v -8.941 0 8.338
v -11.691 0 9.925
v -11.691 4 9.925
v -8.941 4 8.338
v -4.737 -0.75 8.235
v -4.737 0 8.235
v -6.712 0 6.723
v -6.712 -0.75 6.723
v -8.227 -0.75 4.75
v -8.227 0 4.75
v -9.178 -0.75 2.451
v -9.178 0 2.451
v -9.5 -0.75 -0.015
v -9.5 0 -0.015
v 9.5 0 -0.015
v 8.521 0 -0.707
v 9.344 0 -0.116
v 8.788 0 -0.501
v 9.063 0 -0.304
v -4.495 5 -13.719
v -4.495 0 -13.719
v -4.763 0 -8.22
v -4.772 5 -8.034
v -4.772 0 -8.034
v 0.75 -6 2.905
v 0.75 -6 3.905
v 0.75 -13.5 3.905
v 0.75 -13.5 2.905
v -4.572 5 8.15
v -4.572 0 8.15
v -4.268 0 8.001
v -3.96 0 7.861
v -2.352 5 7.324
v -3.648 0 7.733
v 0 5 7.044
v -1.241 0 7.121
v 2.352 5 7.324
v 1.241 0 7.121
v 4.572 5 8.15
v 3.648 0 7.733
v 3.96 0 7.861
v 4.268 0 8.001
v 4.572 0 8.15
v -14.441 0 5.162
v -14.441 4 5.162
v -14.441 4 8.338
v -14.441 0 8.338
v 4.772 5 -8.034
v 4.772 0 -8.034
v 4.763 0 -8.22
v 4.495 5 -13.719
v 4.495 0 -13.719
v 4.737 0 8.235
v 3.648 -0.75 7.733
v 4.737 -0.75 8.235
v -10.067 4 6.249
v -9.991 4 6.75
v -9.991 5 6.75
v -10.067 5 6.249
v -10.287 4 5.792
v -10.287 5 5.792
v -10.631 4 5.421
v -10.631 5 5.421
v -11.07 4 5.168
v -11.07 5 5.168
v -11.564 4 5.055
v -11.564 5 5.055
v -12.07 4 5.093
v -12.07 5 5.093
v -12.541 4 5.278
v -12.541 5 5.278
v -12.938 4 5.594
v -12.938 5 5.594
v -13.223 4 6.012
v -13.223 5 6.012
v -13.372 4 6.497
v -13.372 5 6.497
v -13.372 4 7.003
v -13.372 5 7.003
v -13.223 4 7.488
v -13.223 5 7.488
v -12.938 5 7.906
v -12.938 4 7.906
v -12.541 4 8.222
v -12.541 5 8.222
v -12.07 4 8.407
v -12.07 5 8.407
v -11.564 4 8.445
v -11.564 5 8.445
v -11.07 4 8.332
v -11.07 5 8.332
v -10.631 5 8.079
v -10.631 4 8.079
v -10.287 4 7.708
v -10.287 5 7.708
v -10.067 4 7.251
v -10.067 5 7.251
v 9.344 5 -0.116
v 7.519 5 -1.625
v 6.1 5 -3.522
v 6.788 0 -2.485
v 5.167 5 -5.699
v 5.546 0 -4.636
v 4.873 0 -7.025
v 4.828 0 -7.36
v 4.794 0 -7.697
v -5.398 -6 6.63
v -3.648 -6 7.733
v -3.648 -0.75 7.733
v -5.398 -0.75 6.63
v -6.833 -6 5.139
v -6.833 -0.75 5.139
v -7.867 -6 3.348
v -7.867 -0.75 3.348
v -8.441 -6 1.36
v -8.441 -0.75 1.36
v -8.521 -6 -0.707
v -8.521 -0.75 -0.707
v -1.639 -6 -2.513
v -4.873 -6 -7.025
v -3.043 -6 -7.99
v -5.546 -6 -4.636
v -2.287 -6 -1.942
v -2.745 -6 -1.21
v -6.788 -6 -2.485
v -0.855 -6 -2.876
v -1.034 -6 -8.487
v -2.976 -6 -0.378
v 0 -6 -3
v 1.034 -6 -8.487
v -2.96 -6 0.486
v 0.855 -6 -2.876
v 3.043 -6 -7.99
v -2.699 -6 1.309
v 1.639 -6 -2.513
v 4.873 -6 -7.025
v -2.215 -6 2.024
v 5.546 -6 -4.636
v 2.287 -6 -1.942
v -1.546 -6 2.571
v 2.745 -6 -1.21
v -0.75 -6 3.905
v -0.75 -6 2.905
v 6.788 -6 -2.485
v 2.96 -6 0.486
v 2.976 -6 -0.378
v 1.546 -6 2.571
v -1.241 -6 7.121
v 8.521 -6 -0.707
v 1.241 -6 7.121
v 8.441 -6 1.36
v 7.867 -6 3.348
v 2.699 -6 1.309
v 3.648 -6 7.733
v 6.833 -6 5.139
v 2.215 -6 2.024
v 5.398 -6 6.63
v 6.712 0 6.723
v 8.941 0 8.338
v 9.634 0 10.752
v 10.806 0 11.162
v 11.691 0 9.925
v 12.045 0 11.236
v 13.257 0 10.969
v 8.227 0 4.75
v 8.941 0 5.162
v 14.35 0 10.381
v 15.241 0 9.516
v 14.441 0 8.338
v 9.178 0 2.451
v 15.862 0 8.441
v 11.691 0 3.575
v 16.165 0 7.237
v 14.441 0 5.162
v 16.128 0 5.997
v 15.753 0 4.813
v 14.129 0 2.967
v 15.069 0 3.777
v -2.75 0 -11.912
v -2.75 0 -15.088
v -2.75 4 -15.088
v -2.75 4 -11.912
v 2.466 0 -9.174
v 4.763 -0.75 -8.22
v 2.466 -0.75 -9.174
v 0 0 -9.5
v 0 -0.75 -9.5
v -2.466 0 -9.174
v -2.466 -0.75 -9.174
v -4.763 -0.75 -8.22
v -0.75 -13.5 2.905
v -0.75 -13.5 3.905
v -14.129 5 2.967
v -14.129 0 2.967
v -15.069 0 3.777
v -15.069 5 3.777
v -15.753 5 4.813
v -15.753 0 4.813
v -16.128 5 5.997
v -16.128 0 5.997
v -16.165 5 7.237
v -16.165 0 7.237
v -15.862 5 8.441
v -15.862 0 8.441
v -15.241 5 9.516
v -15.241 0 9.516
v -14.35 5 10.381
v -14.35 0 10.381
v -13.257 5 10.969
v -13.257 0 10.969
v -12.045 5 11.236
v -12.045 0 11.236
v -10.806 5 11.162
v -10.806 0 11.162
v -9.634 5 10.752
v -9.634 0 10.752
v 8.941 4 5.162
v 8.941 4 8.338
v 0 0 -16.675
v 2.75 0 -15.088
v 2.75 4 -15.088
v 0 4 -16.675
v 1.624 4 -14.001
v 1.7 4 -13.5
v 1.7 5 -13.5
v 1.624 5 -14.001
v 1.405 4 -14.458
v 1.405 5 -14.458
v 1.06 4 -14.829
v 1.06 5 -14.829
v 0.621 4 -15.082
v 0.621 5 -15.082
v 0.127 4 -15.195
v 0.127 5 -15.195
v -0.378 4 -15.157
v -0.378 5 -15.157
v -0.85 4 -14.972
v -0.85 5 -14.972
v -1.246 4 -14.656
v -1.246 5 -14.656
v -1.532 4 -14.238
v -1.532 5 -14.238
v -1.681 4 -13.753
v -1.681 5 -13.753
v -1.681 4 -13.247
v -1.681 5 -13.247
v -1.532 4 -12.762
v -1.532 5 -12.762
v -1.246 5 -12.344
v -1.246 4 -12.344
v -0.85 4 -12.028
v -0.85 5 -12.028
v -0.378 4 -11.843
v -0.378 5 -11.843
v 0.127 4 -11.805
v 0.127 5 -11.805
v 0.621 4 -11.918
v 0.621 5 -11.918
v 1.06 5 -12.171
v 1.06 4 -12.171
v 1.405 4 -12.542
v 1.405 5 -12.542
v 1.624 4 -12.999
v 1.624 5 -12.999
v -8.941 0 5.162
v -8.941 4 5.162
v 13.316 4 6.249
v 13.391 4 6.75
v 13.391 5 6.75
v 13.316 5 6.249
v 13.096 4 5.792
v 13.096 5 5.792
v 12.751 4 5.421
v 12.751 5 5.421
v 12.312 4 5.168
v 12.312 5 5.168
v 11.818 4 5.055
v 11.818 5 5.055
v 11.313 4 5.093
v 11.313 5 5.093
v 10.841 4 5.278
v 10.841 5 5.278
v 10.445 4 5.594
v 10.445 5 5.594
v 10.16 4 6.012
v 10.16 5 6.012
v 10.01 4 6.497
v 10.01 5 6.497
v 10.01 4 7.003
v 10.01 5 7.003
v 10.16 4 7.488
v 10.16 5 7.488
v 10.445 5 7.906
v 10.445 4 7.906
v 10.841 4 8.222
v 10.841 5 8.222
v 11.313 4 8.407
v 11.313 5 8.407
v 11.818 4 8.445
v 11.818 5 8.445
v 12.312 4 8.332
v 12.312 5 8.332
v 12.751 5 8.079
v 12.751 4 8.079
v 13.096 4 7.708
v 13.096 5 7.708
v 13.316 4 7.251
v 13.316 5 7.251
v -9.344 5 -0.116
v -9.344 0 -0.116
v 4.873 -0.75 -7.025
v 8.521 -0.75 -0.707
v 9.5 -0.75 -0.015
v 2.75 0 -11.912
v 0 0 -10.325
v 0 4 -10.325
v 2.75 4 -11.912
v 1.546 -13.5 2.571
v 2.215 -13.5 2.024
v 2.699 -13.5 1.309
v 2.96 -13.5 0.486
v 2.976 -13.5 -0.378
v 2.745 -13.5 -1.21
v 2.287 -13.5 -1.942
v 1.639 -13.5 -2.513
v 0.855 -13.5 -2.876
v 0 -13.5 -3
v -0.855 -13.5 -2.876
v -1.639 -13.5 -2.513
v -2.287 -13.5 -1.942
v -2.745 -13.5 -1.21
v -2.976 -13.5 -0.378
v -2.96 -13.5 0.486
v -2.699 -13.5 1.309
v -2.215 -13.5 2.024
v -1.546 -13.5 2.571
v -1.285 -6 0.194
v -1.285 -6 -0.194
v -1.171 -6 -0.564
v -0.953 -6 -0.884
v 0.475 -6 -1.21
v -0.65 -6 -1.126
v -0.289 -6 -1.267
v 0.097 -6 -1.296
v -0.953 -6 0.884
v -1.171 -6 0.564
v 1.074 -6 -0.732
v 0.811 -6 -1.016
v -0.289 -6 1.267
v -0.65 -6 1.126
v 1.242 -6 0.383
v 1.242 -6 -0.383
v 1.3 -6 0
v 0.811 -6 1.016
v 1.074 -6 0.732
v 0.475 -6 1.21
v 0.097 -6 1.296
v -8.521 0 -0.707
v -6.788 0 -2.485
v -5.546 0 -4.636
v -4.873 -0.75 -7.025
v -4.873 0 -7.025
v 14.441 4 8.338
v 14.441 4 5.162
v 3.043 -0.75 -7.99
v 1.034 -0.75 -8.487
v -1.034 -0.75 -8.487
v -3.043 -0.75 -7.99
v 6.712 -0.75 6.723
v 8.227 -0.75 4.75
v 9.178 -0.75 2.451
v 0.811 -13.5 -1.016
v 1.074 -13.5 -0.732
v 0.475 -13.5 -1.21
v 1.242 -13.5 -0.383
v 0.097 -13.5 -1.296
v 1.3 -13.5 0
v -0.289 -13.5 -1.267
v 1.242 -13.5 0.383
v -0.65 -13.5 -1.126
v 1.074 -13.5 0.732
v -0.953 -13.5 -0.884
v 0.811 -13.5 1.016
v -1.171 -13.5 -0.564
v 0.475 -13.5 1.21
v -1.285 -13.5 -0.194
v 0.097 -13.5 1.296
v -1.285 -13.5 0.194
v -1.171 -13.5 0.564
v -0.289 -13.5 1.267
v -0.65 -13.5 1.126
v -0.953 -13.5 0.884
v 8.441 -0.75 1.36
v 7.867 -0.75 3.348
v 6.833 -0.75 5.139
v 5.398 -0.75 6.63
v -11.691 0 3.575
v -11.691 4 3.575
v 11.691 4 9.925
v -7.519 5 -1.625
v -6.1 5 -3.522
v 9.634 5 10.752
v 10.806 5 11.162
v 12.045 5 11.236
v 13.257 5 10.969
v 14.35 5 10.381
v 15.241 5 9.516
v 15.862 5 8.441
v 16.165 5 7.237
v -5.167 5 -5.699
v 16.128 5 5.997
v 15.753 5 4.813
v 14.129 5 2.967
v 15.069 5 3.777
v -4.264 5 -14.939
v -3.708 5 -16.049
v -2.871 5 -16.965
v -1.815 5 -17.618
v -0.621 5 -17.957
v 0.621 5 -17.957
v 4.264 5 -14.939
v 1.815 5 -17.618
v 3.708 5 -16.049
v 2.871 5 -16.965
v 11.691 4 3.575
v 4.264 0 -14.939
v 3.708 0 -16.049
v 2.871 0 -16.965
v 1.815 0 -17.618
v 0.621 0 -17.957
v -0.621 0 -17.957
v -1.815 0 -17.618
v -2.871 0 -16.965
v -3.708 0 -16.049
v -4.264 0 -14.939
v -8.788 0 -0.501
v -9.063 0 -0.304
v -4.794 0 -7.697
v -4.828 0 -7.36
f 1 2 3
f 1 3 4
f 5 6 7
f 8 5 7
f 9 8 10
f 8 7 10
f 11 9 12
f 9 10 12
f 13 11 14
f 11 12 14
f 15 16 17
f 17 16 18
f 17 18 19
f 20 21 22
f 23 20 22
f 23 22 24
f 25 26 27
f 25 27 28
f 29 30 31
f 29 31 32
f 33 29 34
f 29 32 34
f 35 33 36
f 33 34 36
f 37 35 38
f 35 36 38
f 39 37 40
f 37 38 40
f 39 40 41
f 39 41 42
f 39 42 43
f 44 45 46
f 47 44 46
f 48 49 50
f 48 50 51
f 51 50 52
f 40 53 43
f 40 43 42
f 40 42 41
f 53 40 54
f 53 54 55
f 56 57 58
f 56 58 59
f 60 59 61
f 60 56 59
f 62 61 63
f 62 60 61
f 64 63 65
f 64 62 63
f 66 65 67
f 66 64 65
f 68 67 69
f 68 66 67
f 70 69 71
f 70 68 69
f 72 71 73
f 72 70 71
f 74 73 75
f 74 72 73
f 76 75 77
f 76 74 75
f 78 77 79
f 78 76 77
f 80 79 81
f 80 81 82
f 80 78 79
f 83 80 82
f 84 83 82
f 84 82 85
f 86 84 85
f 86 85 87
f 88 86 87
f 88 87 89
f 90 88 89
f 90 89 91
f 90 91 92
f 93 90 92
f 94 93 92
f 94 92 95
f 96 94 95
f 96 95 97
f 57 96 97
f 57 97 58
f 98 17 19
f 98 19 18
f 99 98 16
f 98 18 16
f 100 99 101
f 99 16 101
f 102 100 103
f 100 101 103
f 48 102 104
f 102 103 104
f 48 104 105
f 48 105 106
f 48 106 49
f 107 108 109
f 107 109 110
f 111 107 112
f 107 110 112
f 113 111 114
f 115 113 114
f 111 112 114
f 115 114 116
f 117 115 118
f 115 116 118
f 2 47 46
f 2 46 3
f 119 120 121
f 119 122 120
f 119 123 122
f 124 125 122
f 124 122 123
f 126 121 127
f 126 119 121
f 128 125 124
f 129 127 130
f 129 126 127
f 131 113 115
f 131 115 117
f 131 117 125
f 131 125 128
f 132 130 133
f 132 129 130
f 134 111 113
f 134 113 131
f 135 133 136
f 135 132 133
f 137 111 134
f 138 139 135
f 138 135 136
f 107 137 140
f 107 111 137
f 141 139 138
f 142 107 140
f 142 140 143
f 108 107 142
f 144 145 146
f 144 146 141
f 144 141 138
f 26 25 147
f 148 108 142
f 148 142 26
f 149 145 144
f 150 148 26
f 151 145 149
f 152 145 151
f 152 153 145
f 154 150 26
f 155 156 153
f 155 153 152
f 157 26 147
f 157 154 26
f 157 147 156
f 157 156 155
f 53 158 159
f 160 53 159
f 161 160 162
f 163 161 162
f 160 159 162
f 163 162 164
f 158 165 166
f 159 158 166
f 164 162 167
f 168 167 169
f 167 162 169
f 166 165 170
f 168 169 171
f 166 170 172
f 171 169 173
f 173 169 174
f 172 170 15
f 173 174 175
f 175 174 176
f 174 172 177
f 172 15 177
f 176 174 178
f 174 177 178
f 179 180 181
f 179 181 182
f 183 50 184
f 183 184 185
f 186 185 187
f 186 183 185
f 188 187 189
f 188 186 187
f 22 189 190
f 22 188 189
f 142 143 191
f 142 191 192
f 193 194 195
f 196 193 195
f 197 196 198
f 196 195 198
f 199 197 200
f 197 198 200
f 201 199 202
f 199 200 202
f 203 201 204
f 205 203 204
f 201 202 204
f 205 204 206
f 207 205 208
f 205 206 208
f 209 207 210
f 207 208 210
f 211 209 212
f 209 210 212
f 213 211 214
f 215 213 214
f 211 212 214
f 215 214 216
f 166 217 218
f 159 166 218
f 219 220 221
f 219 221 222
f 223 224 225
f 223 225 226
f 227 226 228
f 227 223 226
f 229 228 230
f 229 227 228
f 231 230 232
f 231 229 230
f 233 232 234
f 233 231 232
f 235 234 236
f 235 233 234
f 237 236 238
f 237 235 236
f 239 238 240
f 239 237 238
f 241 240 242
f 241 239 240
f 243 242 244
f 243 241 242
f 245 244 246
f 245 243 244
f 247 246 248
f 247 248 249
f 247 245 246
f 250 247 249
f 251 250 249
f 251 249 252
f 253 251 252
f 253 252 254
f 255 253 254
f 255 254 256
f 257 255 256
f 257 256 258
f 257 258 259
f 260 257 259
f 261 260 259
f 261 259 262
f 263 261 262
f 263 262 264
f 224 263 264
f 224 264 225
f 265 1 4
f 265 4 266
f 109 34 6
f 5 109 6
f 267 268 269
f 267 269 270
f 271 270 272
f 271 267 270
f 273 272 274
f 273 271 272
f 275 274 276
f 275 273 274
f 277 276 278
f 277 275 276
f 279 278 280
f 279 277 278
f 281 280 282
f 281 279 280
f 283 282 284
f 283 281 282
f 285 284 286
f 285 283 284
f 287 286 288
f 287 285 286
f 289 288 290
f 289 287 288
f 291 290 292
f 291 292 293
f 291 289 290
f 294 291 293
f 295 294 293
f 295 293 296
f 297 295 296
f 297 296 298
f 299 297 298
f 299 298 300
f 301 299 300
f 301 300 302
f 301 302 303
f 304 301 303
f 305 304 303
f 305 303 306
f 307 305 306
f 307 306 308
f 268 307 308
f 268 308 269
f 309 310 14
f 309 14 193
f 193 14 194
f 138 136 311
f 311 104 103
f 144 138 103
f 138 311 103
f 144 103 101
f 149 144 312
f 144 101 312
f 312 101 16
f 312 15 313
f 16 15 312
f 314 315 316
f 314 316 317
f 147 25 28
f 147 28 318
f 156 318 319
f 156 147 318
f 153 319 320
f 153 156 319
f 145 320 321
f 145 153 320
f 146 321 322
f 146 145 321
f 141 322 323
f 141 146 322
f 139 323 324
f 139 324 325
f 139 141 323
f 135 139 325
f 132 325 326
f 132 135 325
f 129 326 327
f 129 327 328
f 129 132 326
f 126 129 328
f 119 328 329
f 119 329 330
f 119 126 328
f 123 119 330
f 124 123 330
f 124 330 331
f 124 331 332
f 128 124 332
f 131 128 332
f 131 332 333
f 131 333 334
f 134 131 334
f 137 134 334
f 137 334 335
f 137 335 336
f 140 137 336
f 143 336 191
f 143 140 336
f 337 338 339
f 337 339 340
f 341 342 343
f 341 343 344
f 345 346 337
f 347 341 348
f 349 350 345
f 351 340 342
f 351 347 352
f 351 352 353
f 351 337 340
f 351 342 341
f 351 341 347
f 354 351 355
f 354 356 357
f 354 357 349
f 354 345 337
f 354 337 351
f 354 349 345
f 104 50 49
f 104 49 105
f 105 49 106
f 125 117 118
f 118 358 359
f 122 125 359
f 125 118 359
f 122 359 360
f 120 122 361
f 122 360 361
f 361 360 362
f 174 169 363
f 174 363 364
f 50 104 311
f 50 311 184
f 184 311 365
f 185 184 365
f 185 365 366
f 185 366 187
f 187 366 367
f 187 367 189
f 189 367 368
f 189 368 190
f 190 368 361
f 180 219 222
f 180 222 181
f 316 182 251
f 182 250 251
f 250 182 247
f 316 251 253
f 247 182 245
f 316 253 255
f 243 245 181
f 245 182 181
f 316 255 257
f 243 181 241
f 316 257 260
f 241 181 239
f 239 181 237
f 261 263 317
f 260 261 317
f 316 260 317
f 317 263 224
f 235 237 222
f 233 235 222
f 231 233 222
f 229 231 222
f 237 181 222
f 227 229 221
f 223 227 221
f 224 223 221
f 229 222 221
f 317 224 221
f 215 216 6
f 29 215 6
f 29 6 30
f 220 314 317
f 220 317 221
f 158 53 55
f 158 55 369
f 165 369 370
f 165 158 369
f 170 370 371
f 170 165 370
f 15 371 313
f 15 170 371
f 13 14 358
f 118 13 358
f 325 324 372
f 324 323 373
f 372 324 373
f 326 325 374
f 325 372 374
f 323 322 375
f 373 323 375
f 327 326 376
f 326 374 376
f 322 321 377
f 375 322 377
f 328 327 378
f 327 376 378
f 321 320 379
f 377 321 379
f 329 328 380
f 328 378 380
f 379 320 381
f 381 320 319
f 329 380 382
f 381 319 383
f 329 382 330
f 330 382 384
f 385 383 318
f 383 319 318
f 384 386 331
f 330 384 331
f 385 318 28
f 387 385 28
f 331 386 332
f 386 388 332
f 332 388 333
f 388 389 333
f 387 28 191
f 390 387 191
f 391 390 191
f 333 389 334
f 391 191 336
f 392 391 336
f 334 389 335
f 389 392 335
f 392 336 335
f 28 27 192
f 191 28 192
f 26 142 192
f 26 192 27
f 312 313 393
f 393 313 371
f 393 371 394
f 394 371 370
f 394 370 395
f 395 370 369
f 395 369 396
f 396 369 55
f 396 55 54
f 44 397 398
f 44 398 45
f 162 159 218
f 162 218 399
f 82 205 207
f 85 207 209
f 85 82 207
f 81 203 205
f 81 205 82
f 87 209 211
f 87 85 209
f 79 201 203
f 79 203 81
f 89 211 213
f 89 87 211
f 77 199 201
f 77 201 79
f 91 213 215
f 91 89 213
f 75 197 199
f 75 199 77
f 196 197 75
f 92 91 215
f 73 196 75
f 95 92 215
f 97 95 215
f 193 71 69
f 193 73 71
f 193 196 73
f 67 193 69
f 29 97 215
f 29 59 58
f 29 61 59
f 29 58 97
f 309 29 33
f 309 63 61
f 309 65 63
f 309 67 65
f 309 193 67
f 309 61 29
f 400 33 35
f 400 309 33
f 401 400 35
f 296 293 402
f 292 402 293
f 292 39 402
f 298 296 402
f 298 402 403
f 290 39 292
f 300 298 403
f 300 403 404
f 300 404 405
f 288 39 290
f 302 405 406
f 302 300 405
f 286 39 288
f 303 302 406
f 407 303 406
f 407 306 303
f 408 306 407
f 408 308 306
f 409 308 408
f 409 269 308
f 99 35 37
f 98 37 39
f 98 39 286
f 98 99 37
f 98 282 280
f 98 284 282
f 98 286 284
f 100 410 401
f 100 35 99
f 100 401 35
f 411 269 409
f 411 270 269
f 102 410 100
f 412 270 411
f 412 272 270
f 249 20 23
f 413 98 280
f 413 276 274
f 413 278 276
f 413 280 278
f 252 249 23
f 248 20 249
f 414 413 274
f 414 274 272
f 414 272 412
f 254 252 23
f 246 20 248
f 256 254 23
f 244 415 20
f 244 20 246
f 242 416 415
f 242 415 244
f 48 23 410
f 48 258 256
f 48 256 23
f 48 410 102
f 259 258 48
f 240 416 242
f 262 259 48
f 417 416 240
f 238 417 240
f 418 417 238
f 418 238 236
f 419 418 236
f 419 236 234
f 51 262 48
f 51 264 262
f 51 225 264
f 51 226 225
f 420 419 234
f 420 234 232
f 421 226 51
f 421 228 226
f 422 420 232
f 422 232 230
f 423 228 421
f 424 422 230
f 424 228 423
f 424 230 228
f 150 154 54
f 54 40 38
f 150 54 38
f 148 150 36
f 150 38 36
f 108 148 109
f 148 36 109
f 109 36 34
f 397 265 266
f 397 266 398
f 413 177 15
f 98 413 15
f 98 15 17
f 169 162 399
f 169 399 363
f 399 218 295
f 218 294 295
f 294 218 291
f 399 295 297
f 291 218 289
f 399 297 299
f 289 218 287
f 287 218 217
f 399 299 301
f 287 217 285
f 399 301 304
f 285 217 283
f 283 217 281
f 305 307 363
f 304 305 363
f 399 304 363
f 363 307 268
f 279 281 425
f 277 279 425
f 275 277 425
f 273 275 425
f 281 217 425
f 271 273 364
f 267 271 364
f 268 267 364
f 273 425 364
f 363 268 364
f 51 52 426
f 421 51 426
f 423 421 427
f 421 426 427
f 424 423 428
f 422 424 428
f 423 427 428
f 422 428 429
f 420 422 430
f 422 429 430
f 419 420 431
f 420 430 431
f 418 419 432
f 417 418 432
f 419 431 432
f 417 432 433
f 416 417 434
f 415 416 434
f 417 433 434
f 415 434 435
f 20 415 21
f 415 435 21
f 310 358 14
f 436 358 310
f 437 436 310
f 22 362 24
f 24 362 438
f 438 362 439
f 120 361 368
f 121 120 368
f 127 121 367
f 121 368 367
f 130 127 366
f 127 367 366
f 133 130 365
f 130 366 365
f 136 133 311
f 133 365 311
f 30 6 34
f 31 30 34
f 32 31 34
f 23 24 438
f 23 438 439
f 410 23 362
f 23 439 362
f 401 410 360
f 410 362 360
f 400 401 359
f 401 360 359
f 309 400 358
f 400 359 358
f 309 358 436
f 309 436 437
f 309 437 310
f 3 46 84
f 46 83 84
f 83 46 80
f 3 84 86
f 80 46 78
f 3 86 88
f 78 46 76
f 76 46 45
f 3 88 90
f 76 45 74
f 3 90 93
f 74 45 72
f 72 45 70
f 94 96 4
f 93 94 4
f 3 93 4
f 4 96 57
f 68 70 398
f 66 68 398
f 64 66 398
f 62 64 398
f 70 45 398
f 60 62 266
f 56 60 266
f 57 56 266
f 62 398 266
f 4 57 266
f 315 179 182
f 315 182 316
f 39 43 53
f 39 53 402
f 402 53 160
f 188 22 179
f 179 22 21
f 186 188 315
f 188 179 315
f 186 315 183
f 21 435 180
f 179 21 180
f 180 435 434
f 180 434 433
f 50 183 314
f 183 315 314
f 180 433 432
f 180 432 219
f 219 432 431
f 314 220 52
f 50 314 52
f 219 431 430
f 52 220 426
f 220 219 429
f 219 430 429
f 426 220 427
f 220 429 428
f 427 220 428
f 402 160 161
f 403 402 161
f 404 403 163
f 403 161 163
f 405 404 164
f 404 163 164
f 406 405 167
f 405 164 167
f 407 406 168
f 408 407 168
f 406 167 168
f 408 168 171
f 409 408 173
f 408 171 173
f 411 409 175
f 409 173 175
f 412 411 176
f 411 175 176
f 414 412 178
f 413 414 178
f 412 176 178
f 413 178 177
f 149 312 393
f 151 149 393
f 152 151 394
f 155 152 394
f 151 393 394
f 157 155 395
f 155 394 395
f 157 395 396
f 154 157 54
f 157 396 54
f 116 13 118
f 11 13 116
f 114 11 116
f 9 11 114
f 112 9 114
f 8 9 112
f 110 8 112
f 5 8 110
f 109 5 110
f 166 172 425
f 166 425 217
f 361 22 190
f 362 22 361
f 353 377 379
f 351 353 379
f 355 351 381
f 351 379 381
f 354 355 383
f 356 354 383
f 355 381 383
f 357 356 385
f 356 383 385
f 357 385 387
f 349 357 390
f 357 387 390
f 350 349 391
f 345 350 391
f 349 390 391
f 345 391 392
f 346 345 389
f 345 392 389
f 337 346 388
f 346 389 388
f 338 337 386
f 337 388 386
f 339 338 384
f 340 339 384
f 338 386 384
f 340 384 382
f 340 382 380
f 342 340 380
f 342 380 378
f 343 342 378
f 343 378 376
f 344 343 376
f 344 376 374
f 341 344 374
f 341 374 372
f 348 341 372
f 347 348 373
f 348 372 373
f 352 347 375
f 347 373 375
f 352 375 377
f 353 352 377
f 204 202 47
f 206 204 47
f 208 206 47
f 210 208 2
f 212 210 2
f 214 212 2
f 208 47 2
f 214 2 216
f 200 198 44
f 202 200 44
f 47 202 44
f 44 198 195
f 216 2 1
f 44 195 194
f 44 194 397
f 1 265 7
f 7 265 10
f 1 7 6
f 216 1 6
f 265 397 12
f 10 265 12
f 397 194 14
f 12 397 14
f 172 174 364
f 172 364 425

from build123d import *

# Parameters (mm, degrees)
SKETCH1_R           = 1.7
BOSS_EXTRUDE1_DEPTH = 5
CUT_EXTRUDE1_START  = -5
CUT_EXTRUDE1_DEPTH  = 4
BOSS_EXTRUDE2_DEPTH = 6
BOSS_EXTRUDE3_DEPTH = 0.75
BOSS_EXTRUDE4_DEPTH = 7.5
SKETCH7_R           = 1.3
CUT_EXTRUDE2_DEPTH  = 7.5


with BuildPart() as part:
    # Sketch1 → Boss-Extrude1 (new body)
    with BuildSketch(Plane(origin=(0, 0, 0), x_dir=(1, 0, 0), z_dir=(0, 1, 0))):
        with BuildLine():
            Line((-4.494644994, 13.719468408), (-4.772250922, 8.034184997))
            ThreePointArc((-4.772250922, 8.034184997), (-6.10009687, 3.52189257), (-9.343933767, 0.115798034))
            Line((-9.343933767, 0.115798034), (-14.128730664, -2.967257459))
            ThreePointArc((-14.128730664, -2.967257459), (-15.588457268, -9), (-9.634085671, -10.752210949))
            Line((-9.634085671, -10.752210949), (-4.571682845, -8.149983031))
            ThreePointArc((-4.571682845, -8.149983031), (0, -7.04378514), (4.571682845, -8.149983031))
            Line((4.571682845, -8.149983031), (9.634085671, -10.752210949))
            ThreePointArc((9.634085671, -10.752210949), (15.588457268, -9), (14.128730664, -2.967257459))
            Line((14.128730664, -2.967257459), (9.343933767, 0.115798034))
            ThreePointArc((9.343933767, 0.115798034), (6.10009687, 3.52189257), (4.772250922, 8.034184997))
            Line((4.772250922, 8.034184997), (4.494644994, 13.719468408))
            ThreePointArc((4.494644994, 13.719468408), (0, 18), (-4.494644994, 13.719468408))
        make_face()
        with Locations((0, 13.5)):
            Circle(SKETCH1_R, mode=Mode.SUBTRACT)
        with Locations((11.691342951, -6.75)):
            Circle(SKETCH1_R, mode=Mode.SUBTRACT)
        with Locations((-11.691342951, -6.75)):
            Circle(SKETCH1_R, mode=Mode.SUBTRACT)
    extrude(amount=BOSS_EXTRUDE1_DEPTH)

    # Sketch2 → Cut-Extrude1 (cut)
    with BuildSketch(Plane(origin=(0, 5, 0), x_dir=(1, 0, 0), z_dir=(0, 1, 0)).offset(CUT_EXTRUDE1_START)):
        Polygon((14.441342951, -8.33771324), (14.441342951, -5.16228676), (11.691342951, -3.574573519), (8.941342951, -5.16228676), (8.941342951, -8.33771324), (11.691342951, -9.925426481), align=None)
        Polygon((0, 16.675426481), (-2.75, 15.08771324), (-2.75, 11.91228676), (0, 10.324573519), (2.75, 11.91228676), (2.75, 15.08771324), align=None)
        Polygon((-14.441342951, -8.33771324), (-11.691342951, -9.925426481), (-8.941342951, -8.33771324), (-8.941342951, -5.16228676), (-11.691342951, -3.574573519), (-14.441342951, -5.16228676), align=None)
    extrude(amount=CUT_EXTRUDE1_DEPTH, mode=Mode.SUBTRACT)

    # Sketch4 → Boss-Extrude2 (add)
    with BuildSketch(Plane.XZ):
        with BuildLine():
            ThreePointArc((-4.872953171, -7.025441438), (0, -8.55), (4.872953171, -7.025441438))
            ThreePointArc((4.872953171, -7.025441438), (6.10009687, -3.52189257), (8.520687343, -0.707380519))
            ThreePointArc((8.520687343, -0.707380519), (7.404517202, 4.275), (3.647734172, 7.732821956))
            ThreePointArc((3.647734172, 7.732821956), (0, 7.04378514), (-3.647734172, 7.732821956))
            ThreePointArc((-3.647734172, 7.732821956), (-7.404517202, 4.275), (-8.520687343, -0.707380519))
            ThreePointArc((-8.520687343, -0.707380519), (-6.10009687, -3.52189257), (-4.872953171, -7.025441438))
        make_face()
    extrude(amount=BOSS_EXTRUDE2_DEPTH)

    # Sketch5 → Boss-Extrude3 (add)
    with BuildSketch(Plane.XZ):
        with BuildLine():
            Line((-9.499987767, -0.015245565), (-8.520687343, -0.707380519))
            ThreePointArc((-8.520687343, -0.707380519), (-7.404517202, 4.275), (-3.647734172, 7.732821956))
            Line((-3.647734172, 7.732821956), (-4.736790837, 8.234853524))
            ThreePointArc((-4.736790837, 8.234853524), (-8.227241336, 4.75), (-9.499987767, -0.015245565))
        make_face()
        with BuildLine():
            Line((9.499987767, -0.015245565), (8.520687343, -0.707380519))
            ThreePointArc((8.520687343, -0.707380519), (7.404517202, 4.275), (3.647734172, 7.732821956))
            Line((3.647734172, 7.732821956), (4.736790837, 8.234853524))
            ThreePointArc((4.736790837, 8.234853524), (8.227241336, 4.75), (9.499987767, -0.015245565))
        make_face()
        with BuildLine():
            Line((-4.76319693, -8.219607959), (-4.872953171, -7.025441438))
            ThreePointArc((-4.872953171, -7.025441438), (0, -8.55), (4.872953171, -7.025441438))
            Line((4.872953171, -7.025441438), (4.76319693, -8.219607959))
            ThreePointArc((4.76319693, -8.219607959), (0, -9.5), (-4.76319693, -8.219607959))
        make_face()
    extrude(amount=BOSS_EXTRUDE3_DEPTH)

    # Sketch6 → Boss-Extrude4 (add)
    with BuildSketch(Plane.XZ.offset(6)):
        with BuildLine():
            Line((-0.75, 2.90473751), (-0.75, 3.90473751))
            Line((-0.75, 3.90473751), (0.75, 3.90473751))
            Line((0.75, 3.90473751), (0.75, 2.90473751))
            ThreePointArc((0.75, 2.90473751), (0, -3), (-0.75, 2.90473751))
        make_face()
    extrude(amount=BOSS_EXTRUDE4_DEPTH)

    # Sketch7 → Cut-Extrude2 (cut)
    with BuildSketch(Plane.XZ.offset(13.5)):
        Circle(SKETCH7_R)
    extrude(amount=-CUT_EXTRUDE2_DEPTH, mode=Mode.SUBTRACT)


solid = part.part
